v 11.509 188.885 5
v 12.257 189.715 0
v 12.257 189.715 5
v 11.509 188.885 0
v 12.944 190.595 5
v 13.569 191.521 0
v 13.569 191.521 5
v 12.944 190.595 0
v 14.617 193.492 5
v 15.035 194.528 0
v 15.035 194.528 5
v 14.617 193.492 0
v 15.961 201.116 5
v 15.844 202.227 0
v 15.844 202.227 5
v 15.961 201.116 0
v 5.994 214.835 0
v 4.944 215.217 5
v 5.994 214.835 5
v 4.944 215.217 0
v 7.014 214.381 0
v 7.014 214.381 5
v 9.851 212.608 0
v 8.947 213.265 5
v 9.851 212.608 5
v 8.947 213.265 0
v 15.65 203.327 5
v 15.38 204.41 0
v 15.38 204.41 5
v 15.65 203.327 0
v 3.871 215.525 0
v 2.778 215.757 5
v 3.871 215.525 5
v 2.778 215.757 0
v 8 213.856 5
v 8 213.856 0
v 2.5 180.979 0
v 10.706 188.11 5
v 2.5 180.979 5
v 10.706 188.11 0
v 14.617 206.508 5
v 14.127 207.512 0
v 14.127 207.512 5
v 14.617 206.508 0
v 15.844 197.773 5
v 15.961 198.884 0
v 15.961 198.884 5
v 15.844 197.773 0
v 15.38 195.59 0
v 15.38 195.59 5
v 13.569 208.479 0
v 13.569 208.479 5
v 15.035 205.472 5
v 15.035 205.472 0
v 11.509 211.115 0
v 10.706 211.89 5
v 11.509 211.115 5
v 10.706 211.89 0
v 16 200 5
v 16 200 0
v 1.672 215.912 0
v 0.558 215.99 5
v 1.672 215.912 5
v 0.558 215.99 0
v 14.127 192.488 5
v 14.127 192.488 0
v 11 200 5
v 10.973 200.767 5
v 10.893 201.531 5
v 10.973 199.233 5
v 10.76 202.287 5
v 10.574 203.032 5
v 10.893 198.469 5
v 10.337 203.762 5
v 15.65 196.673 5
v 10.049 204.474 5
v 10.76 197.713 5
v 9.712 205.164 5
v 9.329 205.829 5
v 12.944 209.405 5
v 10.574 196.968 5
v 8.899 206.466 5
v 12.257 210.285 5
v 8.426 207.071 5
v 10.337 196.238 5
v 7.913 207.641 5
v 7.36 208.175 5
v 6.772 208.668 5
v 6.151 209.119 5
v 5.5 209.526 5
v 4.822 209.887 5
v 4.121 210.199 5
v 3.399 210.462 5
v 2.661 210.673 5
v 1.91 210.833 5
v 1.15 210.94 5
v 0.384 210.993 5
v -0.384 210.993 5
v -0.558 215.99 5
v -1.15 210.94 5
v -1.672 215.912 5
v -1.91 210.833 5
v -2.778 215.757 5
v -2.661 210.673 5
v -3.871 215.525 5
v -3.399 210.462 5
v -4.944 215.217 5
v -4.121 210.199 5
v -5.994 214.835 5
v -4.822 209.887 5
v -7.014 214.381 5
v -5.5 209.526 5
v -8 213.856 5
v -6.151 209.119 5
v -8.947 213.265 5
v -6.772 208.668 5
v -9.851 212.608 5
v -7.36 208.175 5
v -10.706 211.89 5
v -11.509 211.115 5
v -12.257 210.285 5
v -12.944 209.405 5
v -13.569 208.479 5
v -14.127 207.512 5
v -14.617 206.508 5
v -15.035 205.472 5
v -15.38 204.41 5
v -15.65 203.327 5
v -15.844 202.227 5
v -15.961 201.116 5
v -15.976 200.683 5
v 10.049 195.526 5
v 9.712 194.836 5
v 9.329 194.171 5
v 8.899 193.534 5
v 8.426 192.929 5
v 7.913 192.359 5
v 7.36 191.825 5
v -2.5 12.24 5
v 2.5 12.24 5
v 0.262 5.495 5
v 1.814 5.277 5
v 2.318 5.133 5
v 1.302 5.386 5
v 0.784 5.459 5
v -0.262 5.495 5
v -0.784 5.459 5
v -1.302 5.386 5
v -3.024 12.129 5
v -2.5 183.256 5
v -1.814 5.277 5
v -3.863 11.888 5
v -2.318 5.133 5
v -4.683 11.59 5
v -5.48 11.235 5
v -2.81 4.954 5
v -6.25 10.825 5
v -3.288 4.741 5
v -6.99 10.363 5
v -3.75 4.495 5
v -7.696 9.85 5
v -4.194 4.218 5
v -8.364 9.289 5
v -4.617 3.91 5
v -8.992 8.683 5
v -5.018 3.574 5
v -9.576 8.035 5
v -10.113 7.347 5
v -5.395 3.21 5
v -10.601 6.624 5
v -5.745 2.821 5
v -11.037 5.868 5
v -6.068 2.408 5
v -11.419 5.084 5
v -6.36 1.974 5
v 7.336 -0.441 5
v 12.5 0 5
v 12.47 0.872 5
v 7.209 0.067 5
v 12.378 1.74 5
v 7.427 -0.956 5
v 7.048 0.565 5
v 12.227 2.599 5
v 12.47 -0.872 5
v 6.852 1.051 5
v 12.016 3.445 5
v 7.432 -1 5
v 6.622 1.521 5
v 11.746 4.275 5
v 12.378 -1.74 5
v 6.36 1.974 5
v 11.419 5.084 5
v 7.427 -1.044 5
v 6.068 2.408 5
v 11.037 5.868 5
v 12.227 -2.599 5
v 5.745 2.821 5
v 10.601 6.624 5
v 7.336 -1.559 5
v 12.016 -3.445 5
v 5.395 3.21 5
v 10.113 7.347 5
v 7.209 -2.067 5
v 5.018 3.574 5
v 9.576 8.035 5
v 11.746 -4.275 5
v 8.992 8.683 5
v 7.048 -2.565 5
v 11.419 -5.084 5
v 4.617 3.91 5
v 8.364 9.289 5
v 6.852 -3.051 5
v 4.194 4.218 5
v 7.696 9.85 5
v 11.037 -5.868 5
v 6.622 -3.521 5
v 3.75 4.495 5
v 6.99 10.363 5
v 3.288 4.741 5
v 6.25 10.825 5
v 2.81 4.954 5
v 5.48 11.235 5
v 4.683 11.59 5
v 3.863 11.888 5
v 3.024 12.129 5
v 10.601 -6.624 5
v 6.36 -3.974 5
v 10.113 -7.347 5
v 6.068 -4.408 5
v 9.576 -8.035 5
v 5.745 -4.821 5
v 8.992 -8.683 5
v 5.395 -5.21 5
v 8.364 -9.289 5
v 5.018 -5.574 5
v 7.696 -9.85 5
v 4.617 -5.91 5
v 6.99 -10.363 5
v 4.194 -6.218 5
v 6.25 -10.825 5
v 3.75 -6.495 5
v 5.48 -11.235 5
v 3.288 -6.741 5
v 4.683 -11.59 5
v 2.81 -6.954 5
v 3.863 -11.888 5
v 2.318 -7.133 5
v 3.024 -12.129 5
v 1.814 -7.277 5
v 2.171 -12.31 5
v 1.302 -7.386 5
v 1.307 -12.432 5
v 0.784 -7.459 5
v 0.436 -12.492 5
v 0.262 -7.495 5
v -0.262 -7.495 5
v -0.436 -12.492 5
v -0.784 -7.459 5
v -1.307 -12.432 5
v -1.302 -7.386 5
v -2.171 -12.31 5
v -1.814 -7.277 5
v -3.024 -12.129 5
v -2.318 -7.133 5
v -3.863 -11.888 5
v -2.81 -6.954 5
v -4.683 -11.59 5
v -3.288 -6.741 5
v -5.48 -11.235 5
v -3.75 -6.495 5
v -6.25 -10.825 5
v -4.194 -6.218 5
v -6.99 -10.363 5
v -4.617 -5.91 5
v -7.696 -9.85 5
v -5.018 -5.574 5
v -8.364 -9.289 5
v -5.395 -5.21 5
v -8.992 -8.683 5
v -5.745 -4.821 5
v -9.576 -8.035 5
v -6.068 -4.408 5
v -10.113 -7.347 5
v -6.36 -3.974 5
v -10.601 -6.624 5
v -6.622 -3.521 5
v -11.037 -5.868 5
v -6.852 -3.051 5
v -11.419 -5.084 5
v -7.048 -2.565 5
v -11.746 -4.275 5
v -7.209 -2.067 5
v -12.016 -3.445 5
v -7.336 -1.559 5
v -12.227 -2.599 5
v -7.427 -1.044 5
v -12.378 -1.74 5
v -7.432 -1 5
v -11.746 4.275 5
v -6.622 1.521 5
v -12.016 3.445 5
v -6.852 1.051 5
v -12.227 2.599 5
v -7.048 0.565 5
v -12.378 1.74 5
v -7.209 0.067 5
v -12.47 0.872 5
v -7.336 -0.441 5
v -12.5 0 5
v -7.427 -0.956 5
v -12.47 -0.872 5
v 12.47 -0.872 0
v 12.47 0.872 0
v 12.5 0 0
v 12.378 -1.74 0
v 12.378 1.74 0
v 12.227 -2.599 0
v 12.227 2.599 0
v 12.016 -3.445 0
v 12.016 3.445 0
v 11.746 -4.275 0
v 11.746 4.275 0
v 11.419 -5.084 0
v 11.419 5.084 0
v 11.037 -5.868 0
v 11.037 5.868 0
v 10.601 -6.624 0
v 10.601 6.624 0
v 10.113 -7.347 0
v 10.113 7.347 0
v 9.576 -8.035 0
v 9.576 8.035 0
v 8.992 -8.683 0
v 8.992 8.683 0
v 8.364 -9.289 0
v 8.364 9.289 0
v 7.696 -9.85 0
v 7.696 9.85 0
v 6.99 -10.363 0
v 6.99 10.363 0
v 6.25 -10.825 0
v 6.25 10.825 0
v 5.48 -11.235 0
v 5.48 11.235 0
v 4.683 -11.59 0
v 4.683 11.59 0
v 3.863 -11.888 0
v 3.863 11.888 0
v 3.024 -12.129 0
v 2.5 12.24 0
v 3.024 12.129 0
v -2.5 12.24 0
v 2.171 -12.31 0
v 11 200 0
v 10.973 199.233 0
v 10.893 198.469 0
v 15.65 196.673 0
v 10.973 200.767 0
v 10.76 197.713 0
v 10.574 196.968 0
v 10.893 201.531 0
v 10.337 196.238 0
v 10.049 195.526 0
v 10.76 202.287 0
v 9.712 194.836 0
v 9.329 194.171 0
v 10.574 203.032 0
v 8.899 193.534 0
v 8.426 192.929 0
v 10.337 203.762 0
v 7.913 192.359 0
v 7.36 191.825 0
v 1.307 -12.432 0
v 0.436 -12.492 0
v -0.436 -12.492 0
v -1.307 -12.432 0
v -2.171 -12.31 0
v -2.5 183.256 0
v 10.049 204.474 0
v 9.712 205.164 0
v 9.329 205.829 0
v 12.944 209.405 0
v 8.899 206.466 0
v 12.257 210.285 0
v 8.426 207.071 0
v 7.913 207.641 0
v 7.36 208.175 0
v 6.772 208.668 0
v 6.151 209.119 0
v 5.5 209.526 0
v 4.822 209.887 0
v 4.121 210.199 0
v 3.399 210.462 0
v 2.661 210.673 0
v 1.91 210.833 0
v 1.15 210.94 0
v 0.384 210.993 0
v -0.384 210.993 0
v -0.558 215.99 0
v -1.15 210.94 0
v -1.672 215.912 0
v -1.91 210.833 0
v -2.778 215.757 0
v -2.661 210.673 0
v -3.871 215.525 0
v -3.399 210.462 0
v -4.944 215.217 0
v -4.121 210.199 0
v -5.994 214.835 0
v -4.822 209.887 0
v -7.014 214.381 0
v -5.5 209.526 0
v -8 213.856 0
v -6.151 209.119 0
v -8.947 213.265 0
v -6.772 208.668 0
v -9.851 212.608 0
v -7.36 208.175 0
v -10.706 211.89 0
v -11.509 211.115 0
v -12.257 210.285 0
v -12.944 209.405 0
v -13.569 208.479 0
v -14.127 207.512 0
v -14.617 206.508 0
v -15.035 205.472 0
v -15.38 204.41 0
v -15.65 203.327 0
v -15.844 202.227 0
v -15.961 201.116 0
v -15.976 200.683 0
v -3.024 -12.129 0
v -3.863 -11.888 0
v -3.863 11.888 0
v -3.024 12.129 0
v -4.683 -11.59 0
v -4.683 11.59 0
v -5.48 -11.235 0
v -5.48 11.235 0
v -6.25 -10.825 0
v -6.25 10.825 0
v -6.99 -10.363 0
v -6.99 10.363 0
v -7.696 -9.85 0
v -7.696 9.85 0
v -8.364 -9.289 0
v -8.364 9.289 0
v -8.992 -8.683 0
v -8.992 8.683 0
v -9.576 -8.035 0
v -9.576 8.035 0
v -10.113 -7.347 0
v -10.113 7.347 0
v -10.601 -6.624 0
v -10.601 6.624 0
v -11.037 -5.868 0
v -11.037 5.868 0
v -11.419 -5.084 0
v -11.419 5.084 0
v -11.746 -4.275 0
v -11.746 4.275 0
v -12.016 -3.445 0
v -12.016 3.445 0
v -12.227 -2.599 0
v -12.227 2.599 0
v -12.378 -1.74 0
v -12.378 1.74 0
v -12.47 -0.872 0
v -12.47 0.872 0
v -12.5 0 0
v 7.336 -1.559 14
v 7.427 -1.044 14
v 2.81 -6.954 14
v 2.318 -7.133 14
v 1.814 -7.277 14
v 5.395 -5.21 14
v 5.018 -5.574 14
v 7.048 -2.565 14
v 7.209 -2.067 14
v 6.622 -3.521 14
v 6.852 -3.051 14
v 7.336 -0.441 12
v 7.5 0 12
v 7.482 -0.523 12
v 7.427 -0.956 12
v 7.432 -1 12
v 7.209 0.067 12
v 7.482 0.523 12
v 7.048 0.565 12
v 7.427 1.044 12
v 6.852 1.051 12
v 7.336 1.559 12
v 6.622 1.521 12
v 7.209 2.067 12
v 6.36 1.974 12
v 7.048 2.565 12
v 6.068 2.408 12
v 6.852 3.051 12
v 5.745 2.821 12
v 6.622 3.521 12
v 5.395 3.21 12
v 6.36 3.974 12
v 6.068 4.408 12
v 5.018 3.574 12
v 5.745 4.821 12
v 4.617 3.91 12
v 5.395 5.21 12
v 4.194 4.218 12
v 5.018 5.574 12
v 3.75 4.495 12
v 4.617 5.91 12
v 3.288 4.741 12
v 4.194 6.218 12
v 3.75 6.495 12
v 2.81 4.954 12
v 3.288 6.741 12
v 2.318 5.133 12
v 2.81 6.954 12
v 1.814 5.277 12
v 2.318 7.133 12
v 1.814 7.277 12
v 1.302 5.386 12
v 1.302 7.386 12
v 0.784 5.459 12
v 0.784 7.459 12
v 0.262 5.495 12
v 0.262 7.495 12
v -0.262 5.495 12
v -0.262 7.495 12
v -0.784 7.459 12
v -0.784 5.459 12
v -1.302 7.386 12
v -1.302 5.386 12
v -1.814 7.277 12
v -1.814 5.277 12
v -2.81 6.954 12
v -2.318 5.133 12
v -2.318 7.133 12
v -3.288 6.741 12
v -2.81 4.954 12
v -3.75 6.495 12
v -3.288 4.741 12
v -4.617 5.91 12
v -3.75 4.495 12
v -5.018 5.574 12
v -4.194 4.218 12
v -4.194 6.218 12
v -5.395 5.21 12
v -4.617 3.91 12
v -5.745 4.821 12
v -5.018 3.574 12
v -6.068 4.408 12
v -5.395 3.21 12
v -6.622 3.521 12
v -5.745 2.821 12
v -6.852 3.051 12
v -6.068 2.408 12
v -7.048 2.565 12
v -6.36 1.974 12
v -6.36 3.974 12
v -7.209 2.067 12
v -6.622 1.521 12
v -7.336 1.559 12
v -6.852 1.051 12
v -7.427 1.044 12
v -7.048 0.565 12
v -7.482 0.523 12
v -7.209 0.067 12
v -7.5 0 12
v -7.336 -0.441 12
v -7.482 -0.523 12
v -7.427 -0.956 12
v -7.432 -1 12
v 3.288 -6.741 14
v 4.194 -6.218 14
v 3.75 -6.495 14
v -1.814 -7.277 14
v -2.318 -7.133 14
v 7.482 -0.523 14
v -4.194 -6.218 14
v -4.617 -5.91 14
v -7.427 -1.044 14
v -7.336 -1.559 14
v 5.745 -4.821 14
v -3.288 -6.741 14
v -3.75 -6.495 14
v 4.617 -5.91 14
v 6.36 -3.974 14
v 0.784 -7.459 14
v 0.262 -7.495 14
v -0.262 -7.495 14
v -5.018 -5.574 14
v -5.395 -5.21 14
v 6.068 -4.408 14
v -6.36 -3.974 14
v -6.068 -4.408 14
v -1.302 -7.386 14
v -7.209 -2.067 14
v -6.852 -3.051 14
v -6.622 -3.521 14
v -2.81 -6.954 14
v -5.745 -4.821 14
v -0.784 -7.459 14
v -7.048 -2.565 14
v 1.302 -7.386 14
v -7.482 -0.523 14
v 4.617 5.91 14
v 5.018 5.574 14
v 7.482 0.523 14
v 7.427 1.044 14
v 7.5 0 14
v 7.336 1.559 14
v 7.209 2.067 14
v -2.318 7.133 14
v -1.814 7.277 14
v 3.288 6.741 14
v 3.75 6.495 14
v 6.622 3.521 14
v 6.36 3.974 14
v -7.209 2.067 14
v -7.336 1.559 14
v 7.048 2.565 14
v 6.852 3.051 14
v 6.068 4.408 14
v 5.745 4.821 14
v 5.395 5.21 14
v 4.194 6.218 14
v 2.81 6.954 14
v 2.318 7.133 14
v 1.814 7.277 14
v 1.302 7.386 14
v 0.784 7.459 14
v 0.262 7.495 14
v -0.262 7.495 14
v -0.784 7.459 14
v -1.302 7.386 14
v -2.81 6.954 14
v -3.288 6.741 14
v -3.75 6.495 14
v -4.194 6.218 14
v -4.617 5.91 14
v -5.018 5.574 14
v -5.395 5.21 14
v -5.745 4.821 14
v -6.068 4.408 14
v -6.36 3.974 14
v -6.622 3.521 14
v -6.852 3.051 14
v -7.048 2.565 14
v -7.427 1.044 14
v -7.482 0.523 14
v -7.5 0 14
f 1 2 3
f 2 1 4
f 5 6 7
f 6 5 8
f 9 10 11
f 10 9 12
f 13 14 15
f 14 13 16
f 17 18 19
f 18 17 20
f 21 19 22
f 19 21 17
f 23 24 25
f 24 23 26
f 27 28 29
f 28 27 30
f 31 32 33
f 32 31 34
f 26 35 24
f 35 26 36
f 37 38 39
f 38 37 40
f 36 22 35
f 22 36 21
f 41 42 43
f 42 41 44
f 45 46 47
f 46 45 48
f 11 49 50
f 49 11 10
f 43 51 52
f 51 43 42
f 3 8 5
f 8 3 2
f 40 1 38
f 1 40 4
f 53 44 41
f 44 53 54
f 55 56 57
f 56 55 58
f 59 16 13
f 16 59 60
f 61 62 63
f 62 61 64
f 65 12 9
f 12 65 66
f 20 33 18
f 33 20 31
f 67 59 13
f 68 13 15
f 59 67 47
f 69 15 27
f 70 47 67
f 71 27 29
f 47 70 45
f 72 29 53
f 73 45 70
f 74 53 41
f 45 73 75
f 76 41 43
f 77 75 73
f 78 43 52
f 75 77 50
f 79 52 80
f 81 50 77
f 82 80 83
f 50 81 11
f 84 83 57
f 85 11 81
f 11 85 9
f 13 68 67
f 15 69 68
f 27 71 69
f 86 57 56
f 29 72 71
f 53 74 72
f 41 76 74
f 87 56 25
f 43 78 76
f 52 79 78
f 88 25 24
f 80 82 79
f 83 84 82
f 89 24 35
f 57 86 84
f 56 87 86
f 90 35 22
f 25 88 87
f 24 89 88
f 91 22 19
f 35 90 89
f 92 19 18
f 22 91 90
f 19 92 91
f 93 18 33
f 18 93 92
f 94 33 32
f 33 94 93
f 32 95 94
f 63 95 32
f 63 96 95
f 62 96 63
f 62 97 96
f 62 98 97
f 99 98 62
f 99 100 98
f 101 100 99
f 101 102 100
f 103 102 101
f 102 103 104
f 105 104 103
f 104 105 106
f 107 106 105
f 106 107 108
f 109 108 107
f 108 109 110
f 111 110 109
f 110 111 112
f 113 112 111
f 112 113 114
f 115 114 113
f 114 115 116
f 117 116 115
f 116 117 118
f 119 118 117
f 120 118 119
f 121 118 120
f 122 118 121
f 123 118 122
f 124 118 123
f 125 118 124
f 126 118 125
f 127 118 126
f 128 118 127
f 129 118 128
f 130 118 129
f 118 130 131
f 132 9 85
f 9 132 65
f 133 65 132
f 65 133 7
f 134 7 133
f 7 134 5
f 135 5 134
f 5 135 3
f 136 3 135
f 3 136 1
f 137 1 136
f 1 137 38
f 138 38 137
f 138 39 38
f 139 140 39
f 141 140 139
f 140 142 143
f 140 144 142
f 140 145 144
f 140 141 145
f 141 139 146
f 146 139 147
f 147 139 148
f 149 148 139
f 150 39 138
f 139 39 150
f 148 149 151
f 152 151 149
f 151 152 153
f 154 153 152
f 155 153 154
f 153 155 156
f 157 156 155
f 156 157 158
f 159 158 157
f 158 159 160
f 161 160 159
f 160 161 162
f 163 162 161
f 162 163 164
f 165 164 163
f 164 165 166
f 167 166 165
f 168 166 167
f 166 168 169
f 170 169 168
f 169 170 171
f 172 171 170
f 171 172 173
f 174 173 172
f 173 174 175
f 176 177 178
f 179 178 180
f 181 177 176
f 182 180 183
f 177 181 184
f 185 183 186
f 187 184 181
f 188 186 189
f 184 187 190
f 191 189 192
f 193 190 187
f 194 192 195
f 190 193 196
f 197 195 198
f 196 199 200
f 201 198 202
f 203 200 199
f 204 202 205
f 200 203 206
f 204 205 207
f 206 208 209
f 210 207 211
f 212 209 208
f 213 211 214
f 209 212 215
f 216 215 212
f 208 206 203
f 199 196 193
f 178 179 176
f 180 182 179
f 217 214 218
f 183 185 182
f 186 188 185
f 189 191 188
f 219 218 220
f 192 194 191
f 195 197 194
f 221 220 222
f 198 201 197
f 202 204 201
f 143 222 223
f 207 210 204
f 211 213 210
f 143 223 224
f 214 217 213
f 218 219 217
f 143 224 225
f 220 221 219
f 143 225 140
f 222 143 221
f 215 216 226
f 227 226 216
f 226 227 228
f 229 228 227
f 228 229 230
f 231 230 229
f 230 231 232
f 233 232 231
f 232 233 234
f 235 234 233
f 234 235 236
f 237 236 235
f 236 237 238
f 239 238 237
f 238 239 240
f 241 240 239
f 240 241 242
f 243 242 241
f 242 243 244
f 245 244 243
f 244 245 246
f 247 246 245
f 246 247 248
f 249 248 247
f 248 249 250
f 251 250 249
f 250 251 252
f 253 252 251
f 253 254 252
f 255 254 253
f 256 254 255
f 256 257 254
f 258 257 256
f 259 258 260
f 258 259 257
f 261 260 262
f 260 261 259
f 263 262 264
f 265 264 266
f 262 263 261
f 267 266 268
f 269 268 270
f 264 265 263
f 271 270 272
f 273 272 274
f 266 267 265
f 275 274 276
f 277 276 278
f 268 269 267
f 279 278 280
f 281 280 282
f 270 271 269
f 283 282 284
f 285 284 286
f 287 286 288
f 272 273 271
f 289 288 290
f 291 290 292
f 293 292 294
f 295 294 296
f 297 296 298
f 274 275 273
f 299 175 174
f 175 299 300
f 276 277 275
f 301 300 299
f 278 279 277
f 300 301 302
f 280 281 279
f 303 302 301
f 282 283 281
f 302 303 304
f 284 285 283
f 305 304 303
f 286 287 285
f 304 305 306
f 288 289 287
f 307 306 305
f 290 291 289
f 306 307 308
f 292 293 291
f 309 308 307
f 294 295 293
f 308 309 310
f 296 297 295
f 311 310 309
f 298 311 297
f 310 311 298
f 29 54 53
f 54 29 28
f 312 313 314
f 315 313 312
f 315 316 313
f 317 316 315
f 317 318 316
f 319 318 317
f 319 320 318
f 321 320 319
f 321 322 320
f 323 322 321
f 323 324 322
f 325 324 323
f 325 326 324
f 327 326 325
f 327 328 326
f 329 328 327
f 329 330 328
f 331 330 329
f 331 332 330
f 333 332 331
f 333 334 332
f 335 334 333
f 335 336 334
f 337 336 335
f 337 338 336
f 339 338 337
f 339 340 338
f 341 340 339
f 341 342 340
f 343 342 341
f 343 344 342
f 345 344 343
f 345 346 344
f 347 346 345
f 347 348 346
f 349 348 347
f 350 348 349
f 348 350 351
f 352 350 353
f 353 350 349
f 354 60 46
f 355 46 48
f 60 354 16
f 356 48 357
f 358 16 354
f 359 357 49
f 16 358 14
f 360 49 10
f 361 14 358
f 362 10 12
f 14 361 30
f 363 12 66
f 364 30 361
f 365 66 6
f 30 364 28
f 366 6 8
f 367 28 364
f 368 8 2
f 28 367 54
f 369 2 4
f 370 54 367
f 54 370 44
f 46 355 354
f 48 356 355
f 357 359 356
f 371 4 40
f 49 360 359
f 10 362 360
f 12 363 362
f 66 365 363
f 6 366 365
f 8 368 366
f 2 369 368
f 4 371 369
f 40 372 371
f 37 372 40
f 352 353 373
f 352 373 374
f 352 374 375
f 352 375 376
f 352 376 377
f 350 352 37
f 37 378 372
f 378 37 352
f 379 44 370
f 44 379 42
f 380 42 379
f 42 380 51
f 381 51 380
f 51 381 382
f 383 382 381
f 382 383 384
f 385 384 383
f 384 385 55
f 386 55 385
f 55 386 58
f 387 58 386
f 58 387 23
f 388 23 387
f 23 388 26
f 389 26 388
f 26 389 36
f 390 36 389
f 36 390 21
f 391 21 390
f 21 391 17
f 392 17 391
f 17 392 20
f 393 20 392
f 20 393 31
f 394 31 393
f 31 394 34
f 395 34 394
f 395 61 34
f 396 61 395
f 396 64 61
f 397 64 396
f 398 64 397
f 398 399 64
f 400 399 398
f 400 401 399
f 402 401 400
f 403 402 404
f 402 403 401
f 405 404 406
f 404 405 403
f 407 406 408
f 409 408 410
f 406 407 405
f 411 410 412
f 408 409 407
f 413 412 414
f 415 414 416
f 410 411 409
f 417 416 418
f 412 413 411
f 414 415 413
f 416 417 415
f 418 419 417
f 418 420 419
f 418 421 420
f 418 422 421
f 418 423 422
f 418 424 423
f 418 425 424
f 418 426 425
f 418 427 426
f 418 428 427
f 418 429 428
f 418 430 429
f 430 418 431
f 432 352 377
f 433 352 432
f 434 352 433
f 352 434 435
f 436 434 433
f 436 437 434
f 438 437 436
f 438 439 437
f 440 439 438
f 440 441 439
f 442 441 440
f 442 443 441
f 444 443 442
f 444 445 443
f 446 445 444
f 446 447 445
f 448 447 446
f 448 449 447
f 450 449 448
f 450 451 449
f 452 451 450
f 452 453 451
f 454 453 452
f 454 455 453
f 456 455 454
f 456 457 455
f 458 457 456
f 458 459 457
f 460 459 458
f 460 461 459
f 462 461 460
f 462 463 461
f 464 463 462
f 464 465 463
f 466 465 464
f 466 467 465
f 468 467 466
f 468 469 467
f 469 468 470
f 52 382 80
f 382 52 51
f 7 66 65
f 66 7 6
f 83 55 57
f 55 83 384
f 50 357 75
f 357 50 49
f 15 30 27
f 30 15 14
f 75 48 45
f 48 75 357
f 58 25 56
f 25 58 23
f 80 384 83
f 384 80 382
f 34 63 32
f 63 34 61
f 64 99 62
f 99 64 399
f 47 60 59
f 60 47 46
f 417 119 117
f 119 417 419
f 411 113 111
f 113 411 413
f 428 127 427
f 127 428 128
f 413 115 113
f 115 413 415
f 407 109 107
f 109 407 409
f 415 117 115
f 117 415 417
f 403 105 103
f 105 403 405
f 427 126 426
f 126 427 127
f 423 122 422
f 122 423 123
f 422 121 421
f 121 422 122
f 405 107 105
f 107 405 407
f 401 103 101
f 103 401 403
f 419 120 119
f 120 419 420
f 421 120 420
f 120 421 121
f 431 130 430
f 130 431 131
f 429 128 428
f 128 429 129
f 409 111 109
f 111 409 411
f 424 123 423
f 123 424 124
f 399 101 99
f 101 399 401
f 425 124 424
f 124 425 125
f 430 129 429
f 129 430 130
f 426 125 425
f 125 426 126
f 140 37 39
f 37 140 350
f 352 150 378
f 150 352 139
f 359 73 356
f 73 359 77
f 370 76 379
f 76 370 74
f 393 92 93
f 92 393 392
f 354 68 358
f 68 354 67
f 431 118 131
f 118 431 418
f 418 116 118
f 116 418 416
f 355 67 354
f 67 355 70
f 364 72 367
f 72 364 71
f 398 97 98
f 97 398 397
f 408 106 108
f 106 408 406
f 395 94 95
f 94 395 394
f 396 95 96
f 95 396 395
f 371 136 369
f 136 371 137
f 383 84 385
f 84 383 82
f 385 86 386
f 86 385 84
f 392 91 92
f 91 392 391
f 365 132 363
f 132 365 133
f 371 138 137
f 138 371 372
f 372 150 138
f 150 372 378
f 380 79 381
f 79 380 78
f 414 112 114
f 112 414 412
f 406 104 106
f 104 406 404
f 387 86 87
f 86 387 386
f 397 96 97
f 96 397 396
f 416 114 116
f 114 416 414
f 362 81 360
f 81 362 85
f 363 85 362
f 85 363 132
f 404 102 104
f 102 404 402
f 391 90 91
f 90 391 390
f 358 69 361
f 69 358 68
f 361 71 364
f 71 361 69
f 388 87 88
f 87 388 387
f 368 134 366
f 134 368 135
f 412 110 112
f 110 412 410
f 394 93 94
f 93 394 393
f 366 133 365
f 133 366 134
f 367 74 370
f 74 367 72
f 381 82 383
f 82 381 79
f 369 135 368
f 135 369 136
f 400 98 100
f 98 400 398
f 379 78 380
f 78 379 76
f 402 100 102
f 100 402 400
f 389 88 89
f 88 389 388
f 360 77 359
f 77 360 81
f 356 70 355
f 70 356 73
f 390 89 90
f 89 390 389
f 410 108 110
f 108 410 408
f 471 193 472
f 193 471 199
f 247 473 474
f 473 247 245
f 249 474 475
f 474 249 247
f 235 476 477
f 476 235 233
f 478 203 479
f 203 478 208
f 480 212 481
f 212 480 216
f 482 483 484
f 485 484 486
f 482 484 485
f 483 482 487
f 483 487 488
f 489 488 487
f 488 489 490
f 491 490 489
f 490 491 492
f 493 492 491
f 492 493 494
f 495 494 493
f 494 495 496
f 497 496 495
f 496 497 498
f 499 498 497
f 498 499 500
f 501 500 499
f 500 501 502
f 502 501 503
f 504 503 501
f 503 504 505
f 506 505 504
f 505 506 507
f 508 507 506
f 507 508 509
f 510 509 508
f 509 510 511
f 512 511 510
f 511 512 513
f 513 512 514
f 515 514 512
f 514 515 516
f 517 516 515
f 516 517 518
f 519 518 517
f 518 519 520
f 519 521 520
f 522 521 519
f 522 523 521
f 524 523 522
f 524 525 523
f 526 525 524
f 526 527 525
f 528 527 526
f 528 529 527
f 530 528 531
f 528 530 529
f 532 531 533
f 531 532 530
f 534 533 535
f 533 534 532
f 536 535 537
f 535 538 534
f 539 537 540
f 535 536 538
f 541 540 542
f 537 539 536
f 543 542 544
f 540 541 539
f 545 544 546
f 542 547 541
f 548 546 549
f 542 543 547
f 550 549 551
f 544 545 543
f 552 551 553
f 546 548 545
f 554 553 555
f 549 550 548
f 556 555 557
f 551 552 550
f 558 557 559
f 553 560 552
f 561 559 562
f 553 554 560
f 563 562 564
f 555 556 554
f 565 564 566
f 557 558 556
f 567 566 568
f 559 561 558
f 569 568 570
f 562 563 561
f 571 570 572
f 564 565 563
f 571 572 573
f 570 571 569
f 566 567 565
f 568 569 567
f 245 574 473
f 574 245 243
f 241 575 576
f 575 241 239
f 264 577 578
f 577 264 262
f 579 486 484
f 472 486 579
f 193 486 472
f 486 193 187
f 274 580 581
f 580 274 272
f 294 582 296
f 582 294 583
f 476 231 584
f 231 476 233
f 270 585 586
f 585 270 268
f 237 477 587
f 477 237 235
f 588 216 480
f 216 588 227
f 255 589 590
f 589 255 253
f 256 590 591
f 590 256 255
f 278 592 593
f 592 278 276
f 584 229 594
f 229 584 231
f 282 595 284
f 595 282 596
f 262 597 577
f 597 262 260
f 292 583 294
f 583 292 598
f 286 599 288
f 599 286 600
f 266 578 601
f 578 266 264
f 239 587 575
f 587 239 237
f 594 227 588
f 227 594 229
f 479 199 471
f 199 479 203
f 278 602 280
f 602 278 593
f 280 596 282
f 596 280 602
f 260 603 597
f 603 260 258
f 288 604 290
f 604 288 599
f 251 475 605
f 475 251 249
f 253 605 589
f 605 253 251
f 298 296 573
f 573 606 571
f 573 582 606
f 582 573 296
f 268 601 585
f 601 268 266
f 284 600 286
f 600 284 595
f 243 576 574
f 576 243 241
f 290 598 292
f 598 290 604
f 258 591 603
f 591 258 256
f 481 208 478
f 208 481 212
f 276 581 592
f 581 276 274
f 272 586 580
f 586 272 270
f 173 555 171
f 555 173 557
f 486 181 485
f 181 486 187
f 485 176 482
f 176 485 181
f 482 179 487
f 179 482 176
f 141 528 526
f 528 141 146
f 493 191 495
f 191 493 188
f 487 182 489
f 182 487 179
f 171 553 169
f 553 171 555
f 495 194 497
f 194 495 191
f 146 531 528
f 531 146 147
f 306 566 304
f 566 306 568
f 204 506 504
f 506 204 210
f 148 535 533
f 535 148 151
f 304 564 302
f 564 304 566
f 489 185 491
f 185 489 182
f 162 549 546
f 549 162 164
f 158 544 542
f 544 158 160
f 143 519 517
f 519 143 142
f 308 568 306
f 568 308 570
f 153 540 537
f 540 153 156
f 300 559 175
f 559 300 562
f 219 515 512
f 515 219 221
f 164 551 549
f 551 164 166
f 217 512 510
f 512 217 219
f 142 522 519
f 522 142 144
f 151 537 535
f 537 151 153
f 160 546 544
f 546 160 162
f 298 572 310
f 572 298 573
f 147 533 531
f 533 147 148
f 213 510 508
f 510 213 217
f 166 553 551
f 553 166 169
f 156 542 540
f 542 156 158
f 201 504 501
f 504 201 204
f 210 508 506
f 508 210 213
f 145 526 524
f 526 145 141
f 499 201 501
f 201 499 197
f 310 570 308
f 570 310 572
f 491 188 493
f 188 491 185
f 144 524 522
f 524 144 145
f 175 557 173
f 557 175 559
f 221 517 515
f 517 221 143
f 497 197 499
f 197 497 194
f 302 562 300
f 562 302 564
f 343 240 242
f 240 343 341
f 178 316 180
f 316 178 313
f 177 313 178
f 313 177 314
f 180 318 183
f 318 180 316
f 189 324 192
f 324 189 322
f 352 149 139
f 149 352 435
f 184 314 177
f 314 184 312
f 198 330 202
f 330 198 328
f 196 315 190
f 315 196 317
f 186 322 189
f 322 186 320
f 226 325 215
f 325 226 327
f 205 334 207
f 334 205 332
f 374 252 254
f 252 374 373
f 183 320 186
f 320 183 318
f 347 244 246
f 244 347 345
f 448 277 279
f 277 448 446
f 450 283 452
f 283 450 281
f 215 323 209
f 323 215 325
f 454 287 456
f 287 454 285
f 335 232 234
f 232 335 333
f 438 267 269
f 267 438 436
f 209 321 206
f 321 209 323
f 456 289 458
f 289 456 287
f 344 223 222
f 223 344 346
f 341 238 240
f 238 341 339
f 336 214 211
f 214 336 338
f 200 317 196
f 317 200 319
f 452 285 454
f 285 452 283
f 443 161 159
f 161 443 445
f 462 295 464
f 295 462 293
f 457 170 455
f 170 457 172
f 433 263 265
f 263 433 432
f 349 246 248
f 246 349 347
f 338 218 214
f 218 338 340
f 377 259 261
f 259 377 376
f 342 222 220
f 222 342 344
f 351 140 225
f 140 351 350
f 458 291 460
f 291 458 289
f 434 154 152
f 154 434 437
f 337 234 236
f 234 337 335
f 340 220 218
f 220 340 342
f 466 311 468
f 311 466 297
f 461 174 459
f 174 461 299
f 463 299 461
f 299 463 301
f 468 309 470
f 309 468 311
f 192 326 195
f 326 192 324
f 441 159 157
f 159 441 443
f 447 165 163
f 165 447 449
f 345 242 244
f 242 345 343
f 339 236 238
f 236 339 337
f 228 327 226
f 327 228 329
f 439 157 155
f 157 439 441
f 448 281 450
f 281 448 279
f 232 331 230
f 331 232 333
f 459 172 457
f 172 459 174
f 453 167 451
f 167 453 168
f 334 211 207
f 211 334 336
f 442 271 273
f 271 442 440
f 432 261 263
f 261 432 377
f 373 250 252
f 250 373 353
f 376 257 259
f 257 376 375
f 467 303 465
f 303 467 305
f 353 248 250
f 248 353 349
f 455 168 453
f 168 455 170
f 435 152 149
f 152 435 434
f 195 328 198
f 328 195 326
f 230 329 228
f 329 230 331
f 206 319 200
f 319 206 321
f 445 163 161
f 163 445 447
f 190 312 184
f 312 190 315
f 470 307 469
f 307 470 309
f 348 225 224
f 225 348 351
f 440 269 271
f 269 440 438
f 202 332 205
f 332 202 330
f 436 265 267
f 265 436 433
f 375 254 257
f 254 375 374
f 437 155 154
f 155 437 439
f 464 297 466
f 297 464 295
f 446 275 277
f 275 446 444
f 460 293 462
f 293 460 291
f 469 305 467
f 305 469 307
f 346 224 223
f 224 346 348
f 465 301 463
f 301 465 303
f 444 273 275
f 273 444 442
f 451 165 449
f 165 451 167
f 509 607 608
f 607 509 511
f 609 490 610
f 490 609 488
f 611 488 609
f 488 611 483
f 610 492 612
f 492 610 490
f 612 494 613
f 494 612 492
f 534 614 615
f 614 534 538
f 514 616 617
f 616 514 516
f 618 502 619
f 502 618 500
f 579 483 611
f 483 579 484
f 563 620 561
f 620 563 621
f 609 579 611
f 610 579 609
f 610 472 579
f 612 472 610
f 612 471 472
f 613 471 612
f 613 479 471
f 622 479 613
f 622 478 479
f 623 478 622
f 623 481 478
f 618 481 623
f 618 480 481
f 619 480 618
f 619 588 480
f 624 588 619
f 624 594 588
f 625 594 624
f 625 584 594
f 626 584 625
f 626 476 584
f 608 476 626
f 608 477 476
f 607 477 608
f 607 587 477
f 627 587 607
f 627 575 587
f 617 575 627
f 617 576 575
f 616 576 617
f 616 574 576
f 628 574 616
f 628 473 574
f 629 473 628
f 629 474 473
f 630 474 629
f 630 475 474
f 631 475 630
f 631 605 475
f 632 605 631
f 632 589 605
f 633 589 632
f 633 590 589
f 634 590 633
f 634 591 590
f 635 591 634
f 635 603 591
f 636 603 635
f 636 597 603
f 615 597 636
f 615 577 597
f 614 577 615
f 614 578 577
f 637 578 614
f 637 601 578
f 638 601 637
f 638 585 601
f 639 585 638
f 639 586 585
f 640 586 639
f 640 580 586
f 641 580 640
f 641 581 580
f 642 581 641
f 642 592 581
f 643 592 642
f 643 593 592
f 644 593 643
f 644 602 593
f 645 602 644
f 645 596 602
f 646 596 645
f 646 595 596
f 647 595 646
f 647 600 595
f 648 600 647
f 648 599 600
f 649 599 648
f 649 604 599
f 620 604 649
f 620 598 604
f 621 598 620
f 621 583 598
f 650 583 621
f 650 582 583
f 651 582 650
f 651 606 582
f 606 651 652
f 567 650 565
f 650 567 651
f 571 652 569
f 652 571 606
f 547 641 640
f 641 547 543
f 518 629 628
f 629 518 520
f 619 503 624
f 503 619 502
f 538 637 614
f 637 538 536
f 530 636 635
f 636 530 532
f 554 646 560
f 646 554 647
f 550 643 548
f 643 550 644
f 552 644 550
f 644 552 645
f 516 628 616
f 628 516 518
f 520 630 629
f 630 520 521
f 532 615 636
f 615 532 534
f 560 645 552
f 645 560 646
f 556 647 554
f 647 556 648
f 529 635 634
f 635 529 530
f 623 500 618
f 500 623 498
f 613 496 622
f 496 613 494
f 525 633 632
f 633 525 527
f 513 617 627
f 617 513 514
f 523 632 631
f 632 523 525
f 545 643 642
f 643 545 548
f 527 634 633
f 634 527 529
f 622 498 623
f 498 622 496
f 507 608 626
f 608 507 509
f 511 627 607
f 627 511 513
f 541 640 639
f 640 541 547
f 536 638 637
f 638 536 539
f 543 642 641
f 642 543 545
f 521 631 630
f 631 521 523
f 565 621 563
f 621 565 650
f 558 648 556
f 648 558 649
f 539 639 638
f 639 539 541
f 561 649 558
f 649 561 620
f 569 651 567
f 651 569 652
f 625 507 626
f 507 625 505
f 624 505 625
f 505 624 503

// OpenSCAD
pipe=22;

$fn=90;

hole=15;

length=200;

wall=5;
base_wall=wall*1;

mirror_h=7;

grip_z=2;
grip_y=2;
pad=0.1;

module body() {

    translate([0,length])
    cylinder(d=pipe+wall*2,h=wall);

    intersection() {
        translate([0,length])
        hull() {
            cylinder(d=pipe+wall*2,h=wall);
            rotate([0,0,41])
            translate([-pipe*2,0])
            cylinder(d=pipe+wall*2,h=wall);
        }
        translate([pipe*2,length])
        cube([pipe*4,pipe*4,wall*3],center=true);
    } 
    

    translate([-wall/2,0])
    cube([wall,length,wall]);
}
difference() {
    body();
    translate([0,length,-pad])
    hull() {
        cylinder(d=pipe,h=wall+pad*2);
        rotate([0,0,41])
        translate([-pipe*2,0])
        cylinder(d=pipe,h=wall+pad*2);
    }
}

cylinder(d=hole+base_wall*2,h=wall);

intersection() {
    cylinder(d=hole,h=wall+mirror_h);
    translate([0,-grip_y])
    cylinder(d=hole,h=wall+mirror_h);
}

translate([0,0,wall+mirror_h])
cylinder(d=hole,h=grip_z);
